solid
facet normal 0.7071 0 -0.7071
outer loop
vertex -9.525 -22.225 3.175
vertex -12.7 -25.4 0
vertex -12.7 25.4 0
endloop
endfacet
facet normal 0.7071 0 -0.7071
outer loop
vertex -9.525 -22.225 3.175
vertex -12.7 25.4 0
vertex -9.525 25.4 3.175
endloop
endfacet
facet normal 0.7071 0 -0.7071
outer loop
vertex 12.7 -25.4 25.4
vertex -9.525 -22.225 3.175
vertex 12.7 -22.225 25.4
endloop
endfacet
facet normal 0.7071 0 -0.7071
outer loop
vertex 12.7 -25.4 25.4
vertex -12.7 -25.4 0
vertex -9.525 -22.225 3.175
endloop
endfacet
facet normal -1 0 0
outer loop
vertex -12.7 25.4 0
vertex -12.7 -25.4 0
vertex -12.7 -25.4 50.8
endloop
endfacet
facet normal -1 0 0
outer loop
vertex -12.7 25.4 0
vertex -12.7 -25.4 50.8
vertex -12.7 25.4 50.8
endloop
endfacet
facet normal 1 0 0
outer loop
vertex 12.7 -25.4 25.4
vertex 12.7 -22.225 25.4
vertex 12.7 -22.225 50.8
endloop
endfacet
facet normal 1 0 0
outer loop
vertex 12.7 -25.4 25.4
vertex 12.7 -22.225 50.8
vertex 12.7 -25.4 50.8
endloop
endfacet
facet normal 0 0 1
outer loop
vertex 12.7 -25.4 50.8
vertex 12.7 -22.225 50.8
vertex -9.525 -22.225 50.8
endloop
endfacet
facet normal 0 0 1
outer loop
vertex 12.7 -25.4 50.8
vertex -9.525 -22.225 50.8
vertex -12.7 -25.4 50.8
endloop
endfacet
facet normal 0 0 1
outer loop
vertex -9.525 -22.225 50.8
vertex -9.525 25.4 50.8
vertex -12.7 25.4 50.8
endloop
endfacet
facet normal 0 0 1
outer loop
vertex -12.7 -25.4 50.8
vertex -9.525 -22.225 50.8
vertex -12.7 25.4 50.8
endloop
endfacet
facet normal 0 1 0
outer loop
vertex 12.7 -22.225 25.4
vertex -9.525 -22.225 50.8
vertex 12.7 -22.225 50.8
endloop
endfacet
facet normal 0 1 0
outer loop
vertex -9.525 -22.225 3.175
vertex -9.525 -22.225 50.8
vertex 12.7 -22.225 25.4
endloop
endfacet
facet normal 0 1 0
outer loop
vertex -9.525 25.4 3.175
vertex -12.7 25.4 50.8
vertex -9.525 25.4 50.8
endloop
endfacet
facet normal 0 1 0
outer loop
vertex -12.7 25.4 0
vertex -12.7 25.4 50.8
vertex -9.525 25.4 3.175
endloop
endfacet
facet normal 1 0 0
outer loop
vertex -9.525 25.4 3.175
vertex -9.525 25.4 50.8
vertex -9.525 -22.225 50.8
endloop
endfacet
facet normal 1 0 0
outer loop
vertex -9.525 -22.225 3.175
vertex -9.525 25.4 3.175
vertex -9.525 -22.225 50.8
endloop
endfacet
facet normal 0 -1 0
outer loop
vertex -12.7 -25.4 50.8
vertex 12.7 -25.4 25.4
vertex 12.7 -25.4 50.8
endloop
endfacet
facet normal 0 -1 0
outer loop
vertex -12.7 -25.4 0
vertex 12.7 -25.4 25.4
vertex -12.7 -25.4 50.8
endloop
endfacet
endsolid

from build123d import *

# Parameters (mm, degrees)
BOSS_EXTRUDE1_DEPTH = 50.8
CUT_EXTRUDE4_DEPTH  = 73.955945611


with BuildPart() as part:
    # Sketch1 → Boss-Extrude1 (new body)
    with BuildSketch(Plane.XY):
        Polygon((-9.525, -22.225), (12.7, -22.225), (12.7, -25.4), (-12.7, -25.4), (-12.7, 25.4), (-9.525, 25.4), align=None)
    extrude(amount=BOSS_EXTRUDE1_DEPTH)

    # Sketch6 → Cut-Extrude4 (cut, through all)
    with BuildSketch(Plane.XZ.offset(25.4)):
        Polygon((-12.7, 0), (12.7, 25.4), (12.7, 0), align=None)
    extrude(amount=-CUT_EXTRUDE4_DEPTH, mode=Mode.SUBTRACT)


solid = part.part
